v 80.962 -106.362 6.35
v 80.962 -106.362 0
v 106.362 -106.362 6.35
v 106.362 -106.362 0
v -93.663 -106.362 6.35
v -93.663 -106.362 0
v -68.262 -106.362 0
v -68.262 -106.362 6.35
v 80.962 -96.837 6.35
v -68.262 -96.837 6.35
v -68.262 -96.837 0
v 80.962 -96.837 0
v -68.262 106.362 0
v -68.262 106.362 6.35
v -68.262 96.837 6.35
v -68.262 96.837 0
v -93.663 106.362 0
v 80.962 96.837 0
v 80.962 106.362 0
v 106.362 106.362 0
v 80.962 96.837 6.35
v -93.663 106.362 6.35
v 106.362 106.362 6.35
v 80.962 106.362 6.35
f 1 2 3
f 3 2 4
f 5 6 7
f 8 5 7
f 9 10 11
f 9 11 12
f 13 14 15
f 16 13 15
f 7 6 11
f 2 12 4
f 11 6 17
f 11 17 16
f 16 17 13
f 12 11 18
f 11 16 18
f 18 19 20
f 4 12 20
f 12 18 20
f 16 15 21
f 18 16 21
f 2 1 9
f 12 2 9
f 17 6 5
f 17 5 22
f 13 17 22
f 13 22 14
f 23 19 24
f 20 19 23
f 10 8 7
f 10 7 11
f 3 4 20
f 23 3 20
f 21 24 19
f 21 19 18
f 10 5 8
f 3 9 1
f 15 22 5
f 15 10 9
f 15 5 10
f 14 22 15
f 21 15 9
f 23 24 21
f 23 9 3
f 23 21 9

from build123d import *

# Parameters (mm, degrees)
SKETCH1_W          = 200.025
SKETCH1_H          = 212.725
EXTRUDE1_DEPTH     = 6.35
CUT_EXTRUDE1_REACH = 152.553
SKETCH2_W          = 149.225
SKETCH2_H          = 9.525


with BuildPart() as part:
    # Sketch1 → Extrude1 (new body)
    with BuildSketch(Plane.XY):
        with Locations((6.35, 0)):
            Rectangle(SKETCH1_W, SKETCH1_H)
    extrude(amount=EXTRUDE1_DEPTH)

    # Sketch2 → Cut-Extrude1 (cut, up to next)
    with BuildSketch(Plane.XY.offset(6.35), mode=Mode.PRIVATE) as cut_extrude1_sk1:
        with Locations((6.35, -101.6)):
            Rectangle(SKETCH2_W, SKETCH2_H)
    cut_extrude1_tool1 = extrude(cut_extrude1_sk1.sketch, amount=-CUT_EXTRUDE1_REACH, mode=Mode.PRIVATE) & part.part
    cut_extrude1 = cut_extrude1_tool1.solids().sort_by_distance((6.35, -101.6, 6.35))[0]
    add(cut_extrude1, mode=Mode.SUBTRACT)

    # Mirror1: Cut-Extrude1 across plane
    add(cut_extrude1.mirror(Plane.ZX), mode=Mode.SUBTRACT)


solid = part.part
